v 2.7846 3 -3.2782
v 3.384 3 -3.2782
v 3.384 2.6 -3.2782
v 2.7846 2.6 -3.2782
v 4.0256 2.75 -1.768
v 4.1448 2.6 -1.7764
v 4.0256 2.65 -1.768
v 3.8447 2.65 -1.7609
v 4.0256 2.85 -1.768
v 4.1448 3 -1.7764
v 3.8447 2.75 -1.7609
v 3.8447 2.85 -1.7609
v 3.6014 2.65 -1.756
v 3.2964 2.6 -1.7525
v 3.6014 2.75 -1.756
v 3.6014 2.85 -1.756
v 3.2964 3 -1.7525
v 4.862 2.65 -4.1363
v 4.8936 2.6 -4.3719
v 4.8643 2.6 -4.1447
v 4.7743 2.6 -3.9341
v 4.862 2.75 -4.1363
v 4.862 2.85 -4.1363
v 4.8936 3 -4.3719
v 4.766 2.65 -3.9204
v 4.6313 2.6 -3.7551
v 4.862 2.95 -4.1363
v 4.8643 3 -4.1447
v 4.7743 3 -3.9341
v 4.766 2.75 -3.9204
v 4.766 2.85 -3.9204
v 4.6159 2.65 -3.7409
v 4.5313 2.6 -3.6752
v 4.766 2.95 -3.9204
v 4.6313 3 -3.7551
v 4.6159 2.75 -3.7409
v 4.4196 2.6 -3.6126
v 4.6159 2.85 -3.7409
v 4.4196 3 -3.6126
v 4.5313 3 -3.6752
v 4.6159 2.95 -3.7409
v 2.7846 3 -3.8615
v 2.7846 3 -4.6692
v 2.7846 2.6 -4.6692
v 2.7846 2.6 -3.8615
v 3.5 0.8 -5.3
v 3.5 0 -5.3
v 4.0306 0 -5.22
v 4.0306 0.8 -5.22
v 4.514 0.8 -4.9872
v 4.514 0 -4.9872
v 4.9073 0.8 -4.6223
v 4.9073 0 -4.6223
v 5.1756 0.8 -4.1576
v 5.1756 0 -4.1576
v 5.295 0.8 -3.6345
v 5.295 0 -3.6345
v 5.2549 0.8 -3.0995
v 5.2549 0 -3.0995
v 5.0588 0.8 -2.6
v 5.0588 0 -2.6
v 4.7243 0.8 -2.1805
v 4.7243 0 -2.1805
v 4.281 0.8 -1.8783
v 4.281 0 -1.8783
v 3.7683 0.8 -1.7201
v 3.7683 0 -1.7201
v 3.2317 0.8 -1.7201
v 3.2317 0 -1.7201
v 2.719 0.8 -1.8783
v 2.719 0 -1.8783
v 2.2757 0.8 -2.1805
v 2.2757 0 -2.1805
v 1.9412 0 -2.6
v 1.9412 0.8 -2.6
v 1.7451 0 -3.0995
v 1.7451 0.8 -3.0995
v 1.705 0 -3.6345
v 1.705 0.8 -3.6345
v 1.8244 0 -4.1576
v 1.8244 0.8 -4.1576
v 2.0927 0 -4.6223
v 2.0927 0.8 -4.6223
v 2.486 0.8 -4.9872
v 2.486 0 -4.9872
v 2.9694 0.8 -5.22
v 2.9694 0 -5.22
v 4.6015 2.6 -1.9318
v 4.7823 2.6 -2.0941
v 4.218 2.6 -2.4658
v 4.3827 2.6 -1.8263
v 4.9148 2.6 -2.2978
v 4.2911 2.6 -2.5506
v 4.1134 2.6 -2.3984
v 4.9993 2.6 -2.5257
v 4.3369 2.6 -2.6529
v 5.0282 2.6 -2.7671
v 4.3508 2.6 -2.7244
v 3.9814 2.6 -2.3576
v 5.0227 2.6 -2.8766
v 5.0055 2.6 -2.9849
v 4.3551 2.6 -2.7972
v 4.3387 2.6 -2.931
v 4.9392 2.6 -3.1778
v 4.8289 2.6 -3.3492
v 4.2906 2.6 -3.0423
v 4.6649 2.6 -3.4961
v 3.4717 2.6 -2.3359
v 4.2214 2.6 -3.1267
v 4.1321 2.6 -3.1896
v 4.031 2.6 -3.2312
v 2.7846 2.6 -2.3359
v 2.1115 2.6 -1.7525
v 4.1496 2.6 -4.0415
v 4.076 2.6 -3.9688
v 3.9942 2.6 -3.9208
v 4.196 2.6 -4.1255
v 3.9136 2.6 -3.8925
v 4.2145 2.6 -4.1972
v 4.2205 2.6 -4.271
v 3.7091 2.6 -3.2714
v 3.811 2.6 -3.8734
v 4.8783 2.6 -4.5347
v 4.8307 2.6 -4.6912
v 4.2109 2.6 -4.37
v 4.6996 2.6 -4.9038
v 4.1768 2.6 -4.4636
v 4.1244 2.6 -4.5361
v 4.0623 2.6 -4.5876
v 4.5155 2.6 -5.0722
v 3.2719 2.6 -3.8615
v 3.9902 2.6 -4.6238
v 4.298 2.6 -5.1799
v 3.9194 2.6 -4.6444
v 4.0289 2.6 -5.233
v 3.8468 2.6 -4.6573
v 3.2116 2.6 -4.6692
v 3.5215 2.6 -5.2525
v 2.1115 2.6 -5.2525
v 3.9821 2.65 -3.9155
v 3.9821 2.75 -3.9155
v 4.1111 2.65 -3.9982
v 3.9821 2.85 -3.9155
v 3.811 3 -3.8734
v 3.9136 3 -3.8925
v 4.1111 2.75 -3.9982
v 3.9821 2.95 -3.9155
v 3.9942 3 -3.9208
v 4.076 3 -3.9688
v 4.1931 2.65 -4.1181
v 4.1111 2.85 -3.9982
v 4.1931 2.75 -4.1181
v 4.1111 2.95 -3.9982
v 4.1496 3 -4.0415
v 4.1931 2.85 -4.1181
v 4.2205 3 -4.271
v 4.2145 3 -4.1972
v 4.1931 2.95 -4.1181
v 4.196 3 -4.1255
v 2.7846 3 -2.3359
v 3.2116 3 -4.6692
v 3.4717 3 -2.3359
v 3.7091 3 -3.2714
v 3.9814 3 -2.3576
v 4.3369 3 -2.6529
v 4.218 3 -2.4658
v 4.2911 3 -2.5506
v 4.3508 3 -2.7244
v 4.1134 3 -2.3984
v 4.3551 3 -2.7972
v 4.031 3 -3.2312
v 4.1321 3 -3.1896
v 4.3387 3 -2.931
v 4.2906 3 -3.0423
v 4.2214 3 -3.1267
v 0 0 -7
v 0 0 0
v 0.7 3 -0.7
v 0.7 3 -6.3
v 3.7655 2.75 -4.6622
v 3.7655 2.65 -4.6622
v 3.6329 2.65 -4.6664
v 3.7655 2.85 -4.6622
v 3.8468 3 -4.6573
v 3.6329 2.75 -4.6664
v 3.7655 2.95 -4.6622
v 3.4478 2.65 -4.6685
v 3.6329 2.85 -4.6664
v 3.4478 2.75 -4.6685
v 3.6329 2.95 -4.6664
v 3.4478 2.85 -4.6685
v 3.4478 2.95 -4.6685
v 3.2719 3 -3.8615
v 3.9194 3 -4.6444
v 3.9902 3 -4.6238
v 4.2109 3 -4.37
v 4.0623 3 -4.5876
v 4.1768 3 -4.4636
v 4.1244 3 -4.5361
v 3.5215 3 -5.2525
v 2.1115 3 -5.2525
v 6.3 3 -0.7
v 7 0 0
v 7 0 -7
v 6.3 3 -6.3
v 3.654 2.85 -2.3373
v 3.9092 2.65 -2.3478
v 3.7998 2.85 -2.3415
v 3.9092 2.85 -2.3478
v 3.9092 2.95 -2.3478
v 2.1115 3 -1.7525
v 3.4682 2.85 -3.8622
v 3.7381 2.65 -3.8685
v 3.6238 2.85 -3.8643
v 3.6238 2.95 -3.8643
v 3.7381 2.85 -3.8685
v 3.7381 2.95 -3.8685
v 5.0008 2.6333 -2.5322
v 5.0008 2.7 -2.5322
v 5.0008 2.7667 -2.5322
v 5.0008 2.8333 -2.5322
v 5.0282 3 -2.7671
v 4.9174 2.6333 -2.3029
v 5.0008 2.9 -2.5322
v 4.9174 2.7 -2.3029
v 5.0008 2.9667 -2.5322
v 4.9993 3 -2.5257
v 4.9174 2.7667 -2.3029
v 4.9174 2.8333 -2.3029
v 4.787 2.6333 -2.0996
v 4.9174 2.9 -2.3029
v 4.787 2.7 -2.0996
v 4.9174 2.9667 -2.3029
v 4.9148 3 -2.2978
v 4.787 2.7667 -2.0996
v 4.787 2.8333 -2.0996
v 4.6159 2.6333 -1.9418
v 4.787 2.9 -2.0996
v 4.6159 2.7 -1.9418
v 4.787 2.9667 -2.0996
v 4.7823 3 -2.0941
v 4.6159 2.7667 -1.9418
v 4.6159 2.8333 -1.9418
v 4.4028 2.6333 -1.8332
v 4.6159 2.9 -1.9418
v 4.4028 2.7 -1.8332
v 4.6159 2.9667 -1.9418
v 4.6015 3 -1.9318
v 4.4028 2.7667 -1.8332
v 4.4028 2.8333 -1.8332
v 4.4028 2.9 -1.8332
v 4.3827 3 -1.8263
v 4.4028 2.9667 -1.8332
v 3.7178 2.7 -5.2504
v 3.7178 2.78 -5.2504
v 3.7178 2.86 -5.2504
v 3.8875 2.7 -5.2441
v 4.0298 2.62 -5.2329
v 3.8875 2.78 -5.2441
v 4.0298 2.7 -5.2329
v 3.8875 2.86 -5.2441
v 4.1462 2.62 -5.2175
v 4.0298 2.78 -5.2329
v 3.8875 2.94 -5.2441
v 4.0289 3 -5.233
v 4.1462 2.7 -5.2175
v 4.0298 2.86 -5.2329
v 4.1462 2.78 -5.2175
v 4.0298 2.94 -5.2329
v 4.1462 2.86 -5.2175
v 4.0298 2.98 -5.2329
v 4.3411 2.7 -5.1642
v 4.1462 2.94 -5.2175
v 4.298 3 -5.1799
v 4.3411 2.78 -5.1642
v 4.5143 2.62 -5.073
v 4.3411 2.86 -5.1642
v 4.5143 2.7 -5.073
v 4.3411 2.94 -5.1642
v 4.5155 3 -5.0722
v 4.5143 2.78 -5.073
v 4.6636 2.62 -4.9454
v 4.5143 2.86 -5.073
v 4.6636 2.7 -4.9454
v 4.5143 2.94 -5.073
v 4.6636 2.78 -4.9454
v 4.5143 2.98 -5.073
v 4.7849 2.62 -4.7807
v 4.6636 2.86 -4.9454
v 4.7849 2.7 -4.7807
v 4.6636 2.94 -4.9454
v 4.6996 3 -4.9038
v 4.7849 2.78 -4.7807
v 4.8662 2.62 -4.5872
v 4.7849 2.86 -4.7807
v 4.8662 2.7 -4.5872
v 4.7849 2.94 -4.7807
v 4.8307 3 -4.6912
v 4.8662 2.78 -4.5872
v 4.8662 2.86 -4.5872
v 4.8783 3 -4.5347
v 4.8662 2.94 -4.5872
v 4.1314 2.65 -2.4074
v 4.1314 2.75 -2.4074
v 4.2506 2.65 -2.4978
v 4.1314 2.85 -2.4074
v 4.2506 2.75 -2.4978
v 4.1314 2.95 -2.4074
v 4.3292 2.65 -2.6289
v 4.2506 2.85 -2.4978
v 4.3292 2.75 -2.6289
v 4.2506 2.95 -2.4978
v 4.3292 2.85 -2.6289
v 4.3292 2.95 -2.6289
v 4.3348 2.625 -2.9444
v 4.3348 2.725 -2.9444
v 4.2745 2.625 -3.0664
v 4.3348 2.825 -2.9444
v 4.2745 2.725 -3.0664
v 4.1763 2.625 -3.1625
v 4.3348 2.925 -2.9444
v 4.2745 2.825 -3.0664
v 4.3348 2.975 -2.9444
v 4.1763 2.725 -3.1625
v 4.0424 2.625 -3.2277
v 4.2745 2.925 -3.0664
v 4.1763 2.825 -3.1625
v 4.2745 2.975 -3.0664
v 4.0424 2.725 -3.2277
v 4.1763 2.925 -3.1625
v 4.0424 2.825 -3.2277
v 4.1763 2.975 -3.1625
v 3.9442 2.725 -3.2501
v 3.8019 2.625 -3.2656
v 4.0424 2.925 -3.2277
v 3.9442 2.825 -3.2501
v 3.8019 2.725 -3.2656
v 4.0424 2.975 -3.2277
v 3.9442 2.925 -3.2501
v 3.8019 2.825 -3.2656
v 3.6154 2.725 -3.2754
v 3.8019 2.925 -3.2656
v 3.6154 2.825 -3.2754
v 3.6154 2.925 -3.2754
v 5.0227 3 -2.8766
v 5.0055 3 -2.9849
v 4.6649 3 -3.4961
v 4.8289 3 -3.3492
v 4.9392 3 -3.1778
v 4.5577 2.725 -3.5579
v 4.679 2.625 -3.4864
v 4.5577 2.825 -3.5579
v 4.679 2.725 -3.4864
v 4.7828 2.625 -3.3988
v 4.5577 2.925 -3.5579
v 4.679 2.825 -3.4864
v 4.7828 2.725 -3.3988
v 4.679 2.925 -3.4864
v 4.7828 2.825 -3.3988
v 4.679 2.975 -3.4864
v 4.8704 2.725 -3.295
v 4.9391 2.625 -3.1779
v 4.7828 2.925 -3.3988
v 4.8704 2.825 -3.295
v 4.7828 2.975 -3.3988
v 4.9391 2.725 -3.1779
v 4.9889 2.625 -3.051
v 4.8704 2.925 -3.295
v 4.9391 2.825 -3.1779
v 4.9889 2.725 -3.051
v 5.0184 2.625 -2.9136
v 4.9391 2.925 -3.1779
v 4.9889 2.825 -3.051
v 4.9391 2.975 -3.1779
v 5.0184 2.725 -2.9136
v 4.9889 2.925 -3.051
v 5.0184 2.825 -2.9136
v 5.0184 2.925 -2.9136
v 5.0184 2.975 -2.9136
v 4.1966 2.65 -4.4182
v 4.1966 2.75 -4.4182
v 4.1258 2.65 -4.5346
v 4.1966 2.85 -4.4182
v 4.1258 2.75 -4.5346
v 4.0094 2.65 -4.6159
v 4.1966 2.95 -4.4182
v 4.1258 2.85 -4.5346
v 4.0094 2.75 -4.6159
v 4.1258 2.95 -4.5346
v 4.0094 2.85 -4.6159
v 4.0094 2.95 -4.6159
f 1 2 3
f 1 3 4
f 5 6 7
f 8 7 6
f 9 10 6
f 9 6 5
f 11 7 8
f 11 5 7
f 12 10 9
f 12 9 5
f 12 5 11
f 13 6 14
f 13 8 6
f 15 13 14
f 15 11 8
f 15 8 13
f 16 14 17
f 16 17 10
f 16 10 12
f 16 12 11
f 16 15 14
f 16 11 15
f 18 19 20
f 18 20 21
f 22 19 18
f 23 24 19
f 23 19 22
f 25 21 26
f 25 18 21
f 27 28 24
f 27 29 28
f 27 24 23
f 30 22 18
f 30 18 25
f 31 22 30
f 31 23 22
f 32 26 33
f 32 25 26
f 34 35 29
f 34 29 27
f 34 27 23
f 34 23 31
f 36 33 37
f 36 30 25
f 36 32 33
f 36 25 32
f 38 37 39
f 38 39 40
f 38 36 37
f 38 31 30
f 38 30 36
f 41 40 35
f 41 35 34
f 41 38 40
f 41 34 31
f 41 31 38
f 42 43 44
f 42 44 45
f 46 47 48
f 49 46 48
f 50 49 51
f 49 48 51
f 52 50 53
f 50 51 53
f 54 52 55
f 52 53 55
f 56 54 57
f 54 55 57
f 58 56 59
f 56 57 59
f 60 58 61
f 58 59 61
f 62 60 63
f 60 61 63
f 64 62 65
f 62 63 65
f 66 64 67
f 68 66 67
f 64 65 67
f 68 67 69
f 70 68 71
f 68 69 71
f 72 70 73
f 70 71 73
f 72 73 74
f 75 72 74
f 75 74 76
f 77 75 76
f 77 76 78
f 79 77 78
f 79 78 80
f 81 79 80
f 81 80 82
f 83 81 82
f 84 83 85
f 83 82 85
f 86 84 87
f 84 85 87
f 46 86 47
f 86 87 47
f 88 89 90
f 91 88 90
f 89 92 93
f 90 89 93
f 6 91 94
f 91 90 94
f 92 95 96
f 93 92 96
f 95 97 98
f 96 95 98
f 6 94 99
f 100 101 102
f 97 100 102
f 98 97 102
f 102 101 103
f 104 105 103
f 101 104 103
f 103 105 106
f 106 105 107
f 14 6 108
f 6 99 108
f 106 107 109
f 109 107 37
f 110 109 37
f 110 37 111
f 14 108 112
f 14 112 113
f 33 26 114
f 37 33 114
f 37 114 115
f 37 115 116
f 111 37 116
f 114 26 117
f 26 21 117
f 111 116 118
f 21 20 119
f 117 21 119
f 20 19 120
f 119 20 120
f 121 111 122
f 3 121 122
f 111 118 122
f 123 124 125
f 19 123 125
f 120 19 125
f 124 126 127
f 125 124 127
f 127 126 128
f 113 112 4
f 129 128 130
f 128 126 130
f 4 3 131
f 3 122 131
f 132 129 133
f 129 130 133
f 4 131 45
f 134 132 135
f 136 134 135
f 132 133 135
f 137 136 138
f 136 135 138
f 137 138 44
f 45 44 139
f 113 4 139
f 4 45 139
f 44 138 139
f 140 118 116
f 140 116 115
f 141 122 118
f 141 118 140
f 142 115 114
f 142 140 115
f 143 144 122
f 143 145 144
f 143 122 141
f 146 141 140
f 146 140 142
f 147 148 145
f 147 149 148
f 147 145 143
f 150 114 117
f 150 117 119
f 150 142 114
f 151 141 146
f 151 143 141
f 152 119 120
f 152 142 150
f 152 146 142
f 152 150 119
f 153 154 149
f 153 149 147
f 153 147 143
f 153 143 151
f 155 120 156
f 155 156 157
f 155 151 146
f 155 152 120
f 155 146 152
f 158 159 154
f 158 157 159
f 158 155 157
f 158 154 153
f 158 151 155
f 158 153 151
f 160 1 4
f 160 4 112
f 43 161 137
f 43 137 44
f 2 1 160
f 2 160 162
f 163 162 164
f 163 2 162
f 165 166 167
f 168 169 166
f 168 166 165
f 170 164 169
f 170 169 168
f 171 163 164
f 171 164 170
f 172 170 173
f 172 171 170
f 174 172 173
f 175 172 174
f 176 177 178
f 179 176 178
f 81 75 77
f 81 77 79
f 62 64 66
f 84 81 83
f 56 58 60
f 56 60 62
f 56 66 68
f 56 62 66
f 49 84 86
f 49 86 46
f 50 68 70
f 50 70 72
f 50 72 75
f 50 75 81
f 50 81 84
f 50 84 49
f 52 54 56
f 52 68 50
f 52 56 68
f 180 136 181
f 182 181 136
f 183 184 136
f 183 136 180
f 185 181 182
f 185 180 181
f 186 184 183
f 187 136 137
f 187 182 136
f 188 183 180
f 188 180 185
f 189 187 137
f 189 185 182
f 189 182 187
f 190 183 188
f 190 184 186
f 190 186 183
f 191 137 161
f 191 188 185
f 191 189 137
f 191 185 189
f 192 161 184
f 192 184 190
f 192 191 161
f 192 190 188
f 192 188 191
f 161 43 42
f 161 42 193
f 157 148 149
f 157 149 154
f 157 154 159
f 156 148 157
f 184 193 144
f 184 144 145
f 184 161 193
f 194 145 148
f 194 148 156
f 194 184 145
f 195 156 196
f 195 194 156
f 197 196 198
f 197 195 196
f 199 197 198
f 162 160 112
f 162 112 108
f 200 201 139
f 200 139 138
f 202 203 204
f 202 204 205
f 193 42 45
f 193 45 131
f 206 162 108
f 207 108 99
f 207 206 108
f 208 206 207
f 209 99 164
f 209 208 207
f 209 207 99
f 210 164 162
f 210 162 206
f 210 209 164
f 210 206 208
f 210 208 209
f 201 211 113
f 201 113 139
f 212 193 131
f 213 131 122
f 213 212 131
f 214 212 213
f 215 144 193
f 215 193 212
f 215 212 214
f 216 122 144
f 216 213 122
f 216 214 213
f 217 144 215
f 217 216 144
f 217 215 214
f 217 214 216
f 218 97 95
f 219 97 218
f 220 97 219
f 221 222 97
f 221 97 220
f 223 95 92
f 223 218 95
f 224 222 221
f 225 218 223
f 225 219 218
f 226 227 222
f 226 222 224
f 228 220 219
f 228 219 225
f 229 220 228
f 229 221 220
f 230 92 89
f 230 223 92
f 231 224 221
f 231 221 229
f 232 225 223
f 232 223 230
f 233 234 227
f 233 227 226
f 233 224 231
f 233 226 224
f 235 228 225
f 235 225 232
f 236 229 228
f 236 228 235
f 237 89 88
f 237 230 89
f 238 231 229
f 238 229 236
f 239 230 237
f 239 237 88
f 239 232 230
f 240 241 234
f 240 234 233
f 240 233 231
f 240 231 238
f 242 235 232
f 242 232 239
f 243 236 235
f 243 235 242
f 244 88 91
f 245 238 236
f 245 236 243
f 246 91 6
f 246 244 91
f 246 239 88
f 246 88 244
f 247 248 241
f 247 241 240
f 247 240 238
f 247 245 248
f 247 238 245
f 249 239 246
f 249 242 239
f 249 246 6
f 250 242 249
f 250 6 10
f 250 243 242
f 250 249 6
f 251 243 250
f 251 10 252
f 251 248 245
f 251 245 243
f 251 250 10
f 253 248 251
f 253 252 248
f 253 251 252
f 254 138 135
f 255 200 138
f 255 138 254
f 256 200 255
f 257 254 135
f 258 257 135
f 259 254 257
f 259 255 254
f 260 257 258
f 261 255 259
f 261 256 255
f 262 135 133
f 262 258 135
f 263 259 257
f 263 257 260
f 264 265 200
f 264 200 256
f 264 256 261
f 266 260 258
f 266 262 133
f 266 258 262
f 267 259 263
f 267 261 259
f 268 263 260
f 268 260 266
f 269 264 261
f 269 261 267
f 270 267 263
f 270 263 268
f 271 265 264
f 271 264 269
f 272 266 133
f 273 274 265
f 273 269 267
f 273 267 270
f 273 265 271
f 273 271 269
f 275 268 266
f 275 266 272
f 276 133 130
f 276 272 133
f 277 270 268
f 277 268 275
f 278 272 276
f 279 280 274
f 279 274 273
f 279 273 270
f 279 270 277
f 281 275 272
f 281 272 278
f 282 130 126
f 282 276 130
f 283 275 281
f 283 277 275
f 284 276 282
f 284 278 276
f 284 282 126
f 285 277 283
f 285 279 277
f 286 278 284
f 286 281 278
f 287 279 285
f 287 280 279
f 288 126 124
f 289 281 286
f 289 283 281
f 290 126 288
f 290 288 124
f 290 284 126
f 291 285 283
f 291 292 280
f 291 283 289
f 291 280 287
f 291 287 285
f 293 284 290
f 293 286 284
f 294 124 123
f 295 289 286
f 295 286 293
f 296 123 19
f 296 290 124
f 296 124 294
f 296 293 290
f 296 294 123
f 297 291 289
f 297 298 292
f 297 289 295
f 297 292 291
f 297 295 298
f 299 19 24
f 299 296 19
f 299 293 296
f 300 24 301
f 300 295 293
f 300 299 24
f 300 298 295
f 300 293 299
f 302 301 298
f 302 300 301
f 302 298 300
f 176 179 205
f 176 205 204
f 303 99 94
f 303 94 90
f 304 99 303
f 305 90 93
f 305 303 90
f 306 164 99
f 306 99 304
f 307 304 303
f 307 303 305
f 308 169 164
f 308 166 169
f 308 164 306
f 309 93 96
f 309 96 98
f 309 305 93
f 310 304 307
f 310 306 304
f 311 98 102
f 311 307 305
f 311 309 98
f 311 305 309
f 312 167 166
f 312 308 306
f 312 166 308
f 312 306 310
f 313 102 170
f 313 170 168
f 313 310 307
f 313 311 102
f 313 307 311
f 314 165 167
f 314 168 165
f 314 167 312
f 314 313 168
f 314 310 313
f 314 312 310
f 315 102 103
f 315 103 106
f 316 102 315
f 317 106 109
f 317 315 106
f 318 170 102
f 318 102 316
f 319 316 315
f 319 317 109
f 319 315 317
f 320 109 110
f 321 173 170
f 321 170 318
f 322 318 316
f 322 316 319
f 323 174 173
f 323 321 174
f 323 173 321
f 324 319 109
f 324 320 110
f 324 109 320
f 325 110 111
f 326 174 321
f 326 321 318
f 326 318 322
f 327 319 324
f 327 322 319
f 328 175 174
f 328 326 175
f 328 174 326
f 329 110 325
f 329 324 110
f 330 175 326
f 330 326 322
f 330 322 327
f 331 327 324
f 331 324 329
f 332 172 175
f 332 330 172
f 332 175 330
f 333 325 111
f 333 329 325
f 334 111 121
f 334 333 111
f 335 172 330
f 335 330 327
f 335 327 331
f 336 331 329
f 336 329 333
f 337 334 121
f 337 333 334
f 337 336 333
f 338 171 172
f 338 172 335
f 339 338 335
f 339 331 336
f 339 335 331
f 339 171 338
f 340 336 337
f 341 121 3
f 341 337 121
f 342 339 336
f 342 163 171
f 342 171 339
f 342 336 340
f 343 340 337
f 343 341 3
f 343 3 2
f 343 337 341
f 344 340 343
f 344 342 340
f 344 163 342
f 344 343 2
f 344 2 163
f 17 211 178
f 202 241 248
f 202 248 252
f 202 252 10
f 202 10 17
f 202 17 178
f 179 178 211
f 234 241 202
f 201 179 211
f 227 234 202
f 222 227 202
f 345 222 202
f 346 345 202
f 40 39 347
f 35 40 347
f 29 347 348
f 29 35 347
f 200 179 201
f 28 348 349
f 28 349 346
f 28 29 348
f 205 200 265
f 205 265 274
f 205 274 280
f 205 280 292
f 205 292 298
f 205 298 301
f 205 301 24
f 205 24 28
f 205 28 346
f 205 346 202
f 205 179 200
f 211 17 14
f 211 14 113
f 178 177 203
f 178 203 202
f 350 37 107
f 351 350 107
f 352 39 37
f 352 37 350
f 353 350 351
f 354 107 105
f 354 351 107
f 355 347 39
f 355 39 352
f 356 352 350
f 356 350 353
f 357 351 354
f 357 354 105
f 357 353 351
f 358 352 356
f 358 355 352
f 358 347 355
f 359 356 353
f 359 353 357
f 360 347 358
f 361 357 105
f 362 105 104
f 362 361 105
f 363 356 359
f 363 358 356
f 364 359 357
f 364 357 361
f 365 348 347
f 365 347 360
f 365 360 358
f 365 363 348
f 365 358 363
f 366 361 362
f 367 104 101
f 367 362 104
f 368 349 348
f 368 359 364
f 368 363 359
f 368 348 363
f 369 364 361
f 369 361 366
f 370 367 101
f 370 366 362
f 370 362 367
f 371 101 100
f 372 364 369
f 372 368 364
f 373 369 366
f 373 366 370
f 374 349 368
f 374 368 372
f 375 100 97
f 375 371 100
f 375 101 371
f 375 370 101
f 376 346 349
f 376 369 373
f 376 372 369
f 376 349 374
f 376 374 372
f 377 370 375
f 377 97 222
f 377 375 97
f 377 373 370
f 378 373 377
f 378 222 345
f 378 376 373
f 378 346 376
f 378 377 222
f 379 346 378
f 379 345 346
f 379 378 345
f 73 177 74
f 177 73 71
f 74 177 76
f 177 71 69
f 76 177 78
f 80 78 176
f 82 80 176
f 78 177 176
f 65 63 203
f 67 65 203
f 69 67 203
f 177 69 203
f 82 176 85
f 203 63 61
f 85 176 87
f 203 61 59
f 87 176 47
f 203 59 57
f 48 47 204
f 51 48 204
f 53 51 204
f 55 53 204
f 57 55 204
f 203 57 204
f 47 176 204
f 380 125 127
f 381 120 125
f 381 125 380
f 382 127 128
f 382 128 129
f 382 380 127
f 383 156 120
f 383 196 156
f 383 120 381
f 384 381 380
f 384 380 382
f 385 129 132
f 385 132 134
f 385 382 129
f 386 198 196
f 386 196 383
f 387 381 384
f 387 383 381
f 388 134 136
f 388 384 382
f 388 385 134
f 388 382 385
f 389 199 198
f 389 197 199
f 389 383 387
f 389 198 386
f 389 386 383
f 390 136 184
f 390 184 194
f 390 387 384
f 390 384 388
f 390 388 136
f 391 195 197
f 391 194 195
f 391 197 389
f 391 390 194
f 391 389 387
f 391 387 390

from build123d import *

# Parameters (mm, degrees)
SKETCH1_W           = 7
SKETCH1_H           = 7
BOSS_EXTRUDE1_DEPTH = 3
CUT_EXTRUDE1_DEPTH  = 7
CUT_EXTRUDE2_DEPTH  = 11
SKETCH4_R           = 1.8
CUT_EXTRUDE3_DEPTH  = 0.8
CUT_EXTRUDE4_DEPTH  = 0.4


with BuildPart() as part:
    # Sketch1 → Boss-Extrude1 (new body)
    with BuildSketch(Plane(origin=(0, 0, 0), x_dir=(1, 0, 0), z_dir=(0, 1, 0))):
        with Locations((3.5, 3.5)):
            Rectangle(SKETCH1_W, SKETCH1_H)
    extrude(amount=BOSS_EXTRUDE1_DEPTH)

    # Sketch2 → Cut-Extrude1 (cut)
    with BuildSketch(Plane.XY):
        Polygon((0, 0), (0.7, 3), (0, 3), align=None)
        Polygon((7, 0), (6.3, 3), (7, 3), align=None)
    extrude(amount=-CUT_EXTRUDE1_DEPTH, mode=Mode.SUBTRACT)

    # Sketch3 → Cut-Extrude2 (cut)
    with BuildSketch(Plane(origin=(0, 0, 0), x_dir=(0, 0, -1), z_dir=(1, 0, 0))):
        Polygon((0, 0), (0.7, 3), (0, 3), align=None)
        Polygon((7, 3), (6.3, 3), (7, 0), align=None)
    extrude(amount=CUT_EXTRUDE2_DEPTH, mode=Mode.SUBTRACT)

    # Sketch4 → Cut-Extrude3 (cut)
    with BuildSketch(Plane.XZ):
        with Locations(Location((3.5, -3.5, 0), (0, 0, 270))):
            Circle(SKETCH4_R)
    extrude(amount=-CUT_EXTRUDE3_DEPTH, mode=Mode.SUBTRACT)

    # Sketch5 → Cut-Extrude4 (cut)
    with BuildSketch(Plane(origin=(0, 3, 0), x_dir=(1, 0, 0), z_dir=(0, 1, 0))):
        with BuildLine():
            Line((2.111509743, 5.252535384), (3.521465672, 5.252535384))
            add(Edge.make_bspline(
                [(3.521465672, 5.252535384), (3.555352929, 5.252333756), (3.620793103, 5.251944389), (3.715699078, 5.250859268), (3.803790562, 5.247672529), (3.88520473, 5.244936095), (3.959670809, 5.238536714), (4.027774054, 5.233508957), (4.089300044, 5.226592072), (4.161779262, 5.215398498), (4.246059792, 5.197987684), (4.341252586, 5.165782389), (4.43148602, 5.125545022), (4.515403802, 5.074389368), (4.593284686, 5.014559615), (4.665724305, 4.946532312), (4.729381186, 4.867558536), (4.786703202, 4.781364769), (4.835087081, 4.687878618), (4.868405373, 4.587306133), (4.88966817, 4.481491325), (4.892245345, 4.408956406), (4.893561025, 4.37192641)],
                knots=[0, 0, 0, 0, 1.096610875, 2.117681168, 3.071055591, 3.949137991, 4.753059115, 5.489127199, 6.15892391, 6.75575099, 7.862330316, 8.938514814, 10.001276227, 11.05313779, 12.110449801, 13.174958802, 14.260456508, 15.384725817, 16.521138801, 17.654729897, 18.802709851, 20, 20, 20, 20], degree=3))
            add(Edge.make_bspline(
                [(4.893561025, 4.37192641), (4.892196479, 4.331601681), (4.889505896, 4.252090262), (4.864462524, 4.135494667), (4.824571342, 4.023939737), (4.768250724, 3.919235161), (4.699269413, 3.823150089), (4.617676049, 3.738775738), (4.524669493, 3.666625119), (4.454832509, 3.630722743), (4.419602692, 3.612611506)],
                knots=[0, 0, 0, 0, 1.023065178, 2.01725758, 3.014298905, 4.023406433, 5.026736079, 6.009055718, 6.99565244, 8, 8, 8, 8], degree=3))
            add(Edge.make_bspline(
                [(4.419602692, 3.612611506), (4.443330648, 3.604529528), (4.490246921, 3.588549379), (4.557400348, 3.559205258), (4.620319472, 3.52517498), (4.678972699, 3.487531632), (4.733805186, 3.446000029), (4.783214944, 3.399203081), (4.83003713, 3.349803196), (4.871143379, 3.295320645), (4.908350842, 3.238361247), (4.939934418, 3.17803347), (4.967283165, 3.115788352), (4.990155428, 3.050995933), (5.006459358, 2.983221651), (5.019523083, 2.913319286), (5.02620612, 2.840804369), (5.027514255, 2.791842338), (5.02817641, 2.767058621)],
                knots=[0, 0, 0, 0, 1.072651974, 2.1209089, 3.132484228, 4.131466326, 5.101889999, 6.071643115, 7.041396231, 8.011819904, 8.988565287, 9.95070344, 10.922775742, 11.897213062, 12.887138018, 13.903598663, 14.938838629, 16, 16, 16, 16], degree=3))
            add(Edge.make_bspline(
                [(5.02817641, 2.767058621), (5.026768086, 2.727480727), (5.02395794, 2.64850764), (5.002958076, 2.530696633), (4.96749134, 2.414960489), (4.919462058, 2.302050025), (4.859804392, 2.195584607), (4.789667704, 2.098381872), (4.707836651, 2.01380613), (4.617215838, 1.939282584), (4.515099833, 1.877587714), (4.401575881, 1.830197397), (4.277361379, 1.794394944), (4.18985285, 1.782501682), (4.144762948, 1.776373525)],
                knots=[0, 0, 0, 0, 0.975059807, 1.945618526, 2.93861228, 3.952760547, 4.963632603, 5.940527786, 6.897802811, 7.855787948, 8.824773195, 9.82606706, 10.879852914, 12, 12, 12, 12], degree=3))
            add(Edge.make_bspline(
                [(4.144762948, 1.776373525), (4.127472996, 1.774915024), (4.087782581, 1.771566924), (4.020469845, 1.767404325), (3.937705498, 1.764257864), (3.839561406, 1.760537572), (3.725735437, 1.757851413), (3.596486285, 1.756017129), (3.451593418, 1.75363659), (3.349925557, 1.752915159), (3.296405576, 1.752535384)],
                knots=[0, 0, 0, 0, 0.490565993, 1.126131979, 1.906526787, 2.832178623, 3.902933831, 5.125497984, 6.486805064, 8, 8, 8, 8], degree=3))
            Line((3.296405576, 1.752535384), (2.111509743, 1.752535384))
            Line((2.111509743, 1.752535384), (2.111509743, 5.252535384))
        make_face()
        with BuildLine():
            Line((2.784586666, 4.669202051), (2.784586666, 3.861509743))
            Line((2.784586666, 3.861509743), (3.271866313, 3.861509743))
            add(Edge.make_bspline(
                [(3.271866313, 3.861509743), (3.306221586, 3.861434055), (3.371661079, 3.861289884), (3.464674551, 3.862255994), (3.547646114, 3.862707017), (3.620337221, 3.8640307), (3.682732948, 3.866215267), (3.734608475, 3.868396735), (3.776263571, 3.870048358), (3.800518366, 3.872406802), (3.811028974, 3.873428813)],
                knots=[0, 0, 0, 0, 1.528479216, 2.911428072, 4.138414629, 5.21998762, 6.145918986, 6.915989543, 7.530253335, 8, 8, 8, 8], degree=3))
            add(Edge.make_bspline(
                [(3.811028974, 3.873428813), (3.841339923, 3.877989922), (3.899595708, 3.886756091), (3.981115359, 3.912443032), (4.051822858, 3.949594446), (4.112503082, 3.995838149), (4.16067052, 4.052573755), (4.196017974, 4.117840239), (4.216698833, 4.191911851), (4.219190867, 4.243956456), (4.220484102, 4.270964871)],
                knots=[0, 0, 0, 0, 1.162079002, 2.233444551, 3.225172046, 4.179556897, 5.110707885, 6.027301426, 6.976273101, 8, 8, 8, 8], degree=3))
            add(Edge.make_bspline(
                [(4.220484102, 4.270964871), (4.219672292, 4.297045189), (4.21811382, 4.347112917), (4.198753979, 4.418001877), (4.169647913, 4.481665844), (4.127102602, 4.536540746), (4.073714805, 4.582883197), (4.008370927, 4.619083019), (3.931384749, 4.643991925), (3.875931131, 4.652704095), (3.846786185, 4.65728298)],
                knots=[0, 0, 0, 0, 1.044241546, 2.004684189, 2.928111627, 3.838334562, 4.769594837, 5.748424953, 6.81663206, 8, 8, 8, 8], degree=3))
            add(Edge.make_bspline(
                [(3.846786185, 4.65728298), (3.835340353, 4.658308087), (3.808280354, 4.660731624), (3.761249742, 4.662307099), (3.701429573, 4.664524478), (3.628514928, 4.666688526), (3.542503834, 4.668009799), (3.443640912, 4.668455112), (3.331930575, 4.669425441), (3.253169995, 4.669279261), (3.211569839, 4.669202051)],
                knots=[0, 0, 0, 0, 0.433943041, 1.02591908, 1.776648879, 2.694999143, 3.780816848, 5.02540149, 6.428861738, 8, 8, 8, 8], degree=3))
            Line((3.211569839, 4.669202051), (2.784586666, 4.669202051))
        make_face(mode=Mode.SUBTRACT)
        with BuildLine():
            Line((2.784586666, 3.27817641), (2.784586666, 2.335868717))
            Line((2.784586666, 2.335868717), (3.471686025, 2.335868717))
            add(Edge.make_bspline(
                [(3.471686025, 2.335868717), (3.503705507, 2.335709884), (3.564476207, 2.33540843), (3.651169443, 2.337427531), (3.728560529, 2.338093302), (3.79701169, 2.341414873), (3.856163227, 2.343927607), (3.906258531, 2.347060152), (3.946906458, 2.352041803), (3.970893783, 2.355909309), (3.98140157, 2.357603493)],
                knots=[0, 0, 0, 0, 1.504773752, 2.85595359, 4.075347731, 5.141676974, 6.076328919, 6.858106537, 7.499786952, 8, 8, 8, 8], degree=3))
            add(Edge.make_bspline(
                [(3.98140157, 2.357603493), (4.008085962, 2.36323372), (4.059931656, 2.374172812), (4.13178912, 2.405562615), (4.196552287, 2.445370583), (4.252642198, 2.496532162), (4.298745197, 2.557822327), (4.332034841, 2.629376077), (4.352110737, 2.710351547), (4.354073968, 2.767404519), (4.355099486, 2.797206858)],
                knots=[0, 0, 0, 0, 1.031056579, 2.003262591, 2.954260215, 3.900917722, 4.862741126, 5.841340256, 6.872396835, 8, 8, 8, 8], degree=3))
            add(Edge.make_bspline(
                [(4.355099486, 2.797206858), (4.354271867, 2.82276493), (4.352661002, 2.872510733), (4.336892789, 2.943762046), (4.311385128, 3.008909067), (4.275862523, 3.067507228), (4.231481376, 3.120292471), (4.17661735, 3.164466336), (4.113275558, 3.201270071), (4.052892173, 3.225515958), (3.995633073, 3.241071138), (3.941019912, 3.251275641), (3.875199891, 3.25935328), (3.798492104, 3.266186067), (3.710585277, 3.271650146), (3.611715662, 3.275957666), (3.501607357, 3.277760533), (3.424477404, 3.278033382), (3.384045801, 3.27817641)],
                knots=[0, 0, 0, 0, 0.992165387, 1.931134082, 2.820086661, 3.700270762, 4.583075858, 5.486803518, 6.423132184, 7.421722103, 8.005700193, 8.727213115, 9.57900282, 10.582332745, 11.720121093, 13.002085041, 14.428489784, 16, 16, 16, 16], degree=3))
            Line((3.384045801, 3.27817641), (2.784586666, 3.27817641))
        make_face(mode=Mode.SUBTRACT)
    extrude(amount=-CUT_EXTRUDE4_DEPTH, mode=Mode.SUBTRACT)


solid = part.part
